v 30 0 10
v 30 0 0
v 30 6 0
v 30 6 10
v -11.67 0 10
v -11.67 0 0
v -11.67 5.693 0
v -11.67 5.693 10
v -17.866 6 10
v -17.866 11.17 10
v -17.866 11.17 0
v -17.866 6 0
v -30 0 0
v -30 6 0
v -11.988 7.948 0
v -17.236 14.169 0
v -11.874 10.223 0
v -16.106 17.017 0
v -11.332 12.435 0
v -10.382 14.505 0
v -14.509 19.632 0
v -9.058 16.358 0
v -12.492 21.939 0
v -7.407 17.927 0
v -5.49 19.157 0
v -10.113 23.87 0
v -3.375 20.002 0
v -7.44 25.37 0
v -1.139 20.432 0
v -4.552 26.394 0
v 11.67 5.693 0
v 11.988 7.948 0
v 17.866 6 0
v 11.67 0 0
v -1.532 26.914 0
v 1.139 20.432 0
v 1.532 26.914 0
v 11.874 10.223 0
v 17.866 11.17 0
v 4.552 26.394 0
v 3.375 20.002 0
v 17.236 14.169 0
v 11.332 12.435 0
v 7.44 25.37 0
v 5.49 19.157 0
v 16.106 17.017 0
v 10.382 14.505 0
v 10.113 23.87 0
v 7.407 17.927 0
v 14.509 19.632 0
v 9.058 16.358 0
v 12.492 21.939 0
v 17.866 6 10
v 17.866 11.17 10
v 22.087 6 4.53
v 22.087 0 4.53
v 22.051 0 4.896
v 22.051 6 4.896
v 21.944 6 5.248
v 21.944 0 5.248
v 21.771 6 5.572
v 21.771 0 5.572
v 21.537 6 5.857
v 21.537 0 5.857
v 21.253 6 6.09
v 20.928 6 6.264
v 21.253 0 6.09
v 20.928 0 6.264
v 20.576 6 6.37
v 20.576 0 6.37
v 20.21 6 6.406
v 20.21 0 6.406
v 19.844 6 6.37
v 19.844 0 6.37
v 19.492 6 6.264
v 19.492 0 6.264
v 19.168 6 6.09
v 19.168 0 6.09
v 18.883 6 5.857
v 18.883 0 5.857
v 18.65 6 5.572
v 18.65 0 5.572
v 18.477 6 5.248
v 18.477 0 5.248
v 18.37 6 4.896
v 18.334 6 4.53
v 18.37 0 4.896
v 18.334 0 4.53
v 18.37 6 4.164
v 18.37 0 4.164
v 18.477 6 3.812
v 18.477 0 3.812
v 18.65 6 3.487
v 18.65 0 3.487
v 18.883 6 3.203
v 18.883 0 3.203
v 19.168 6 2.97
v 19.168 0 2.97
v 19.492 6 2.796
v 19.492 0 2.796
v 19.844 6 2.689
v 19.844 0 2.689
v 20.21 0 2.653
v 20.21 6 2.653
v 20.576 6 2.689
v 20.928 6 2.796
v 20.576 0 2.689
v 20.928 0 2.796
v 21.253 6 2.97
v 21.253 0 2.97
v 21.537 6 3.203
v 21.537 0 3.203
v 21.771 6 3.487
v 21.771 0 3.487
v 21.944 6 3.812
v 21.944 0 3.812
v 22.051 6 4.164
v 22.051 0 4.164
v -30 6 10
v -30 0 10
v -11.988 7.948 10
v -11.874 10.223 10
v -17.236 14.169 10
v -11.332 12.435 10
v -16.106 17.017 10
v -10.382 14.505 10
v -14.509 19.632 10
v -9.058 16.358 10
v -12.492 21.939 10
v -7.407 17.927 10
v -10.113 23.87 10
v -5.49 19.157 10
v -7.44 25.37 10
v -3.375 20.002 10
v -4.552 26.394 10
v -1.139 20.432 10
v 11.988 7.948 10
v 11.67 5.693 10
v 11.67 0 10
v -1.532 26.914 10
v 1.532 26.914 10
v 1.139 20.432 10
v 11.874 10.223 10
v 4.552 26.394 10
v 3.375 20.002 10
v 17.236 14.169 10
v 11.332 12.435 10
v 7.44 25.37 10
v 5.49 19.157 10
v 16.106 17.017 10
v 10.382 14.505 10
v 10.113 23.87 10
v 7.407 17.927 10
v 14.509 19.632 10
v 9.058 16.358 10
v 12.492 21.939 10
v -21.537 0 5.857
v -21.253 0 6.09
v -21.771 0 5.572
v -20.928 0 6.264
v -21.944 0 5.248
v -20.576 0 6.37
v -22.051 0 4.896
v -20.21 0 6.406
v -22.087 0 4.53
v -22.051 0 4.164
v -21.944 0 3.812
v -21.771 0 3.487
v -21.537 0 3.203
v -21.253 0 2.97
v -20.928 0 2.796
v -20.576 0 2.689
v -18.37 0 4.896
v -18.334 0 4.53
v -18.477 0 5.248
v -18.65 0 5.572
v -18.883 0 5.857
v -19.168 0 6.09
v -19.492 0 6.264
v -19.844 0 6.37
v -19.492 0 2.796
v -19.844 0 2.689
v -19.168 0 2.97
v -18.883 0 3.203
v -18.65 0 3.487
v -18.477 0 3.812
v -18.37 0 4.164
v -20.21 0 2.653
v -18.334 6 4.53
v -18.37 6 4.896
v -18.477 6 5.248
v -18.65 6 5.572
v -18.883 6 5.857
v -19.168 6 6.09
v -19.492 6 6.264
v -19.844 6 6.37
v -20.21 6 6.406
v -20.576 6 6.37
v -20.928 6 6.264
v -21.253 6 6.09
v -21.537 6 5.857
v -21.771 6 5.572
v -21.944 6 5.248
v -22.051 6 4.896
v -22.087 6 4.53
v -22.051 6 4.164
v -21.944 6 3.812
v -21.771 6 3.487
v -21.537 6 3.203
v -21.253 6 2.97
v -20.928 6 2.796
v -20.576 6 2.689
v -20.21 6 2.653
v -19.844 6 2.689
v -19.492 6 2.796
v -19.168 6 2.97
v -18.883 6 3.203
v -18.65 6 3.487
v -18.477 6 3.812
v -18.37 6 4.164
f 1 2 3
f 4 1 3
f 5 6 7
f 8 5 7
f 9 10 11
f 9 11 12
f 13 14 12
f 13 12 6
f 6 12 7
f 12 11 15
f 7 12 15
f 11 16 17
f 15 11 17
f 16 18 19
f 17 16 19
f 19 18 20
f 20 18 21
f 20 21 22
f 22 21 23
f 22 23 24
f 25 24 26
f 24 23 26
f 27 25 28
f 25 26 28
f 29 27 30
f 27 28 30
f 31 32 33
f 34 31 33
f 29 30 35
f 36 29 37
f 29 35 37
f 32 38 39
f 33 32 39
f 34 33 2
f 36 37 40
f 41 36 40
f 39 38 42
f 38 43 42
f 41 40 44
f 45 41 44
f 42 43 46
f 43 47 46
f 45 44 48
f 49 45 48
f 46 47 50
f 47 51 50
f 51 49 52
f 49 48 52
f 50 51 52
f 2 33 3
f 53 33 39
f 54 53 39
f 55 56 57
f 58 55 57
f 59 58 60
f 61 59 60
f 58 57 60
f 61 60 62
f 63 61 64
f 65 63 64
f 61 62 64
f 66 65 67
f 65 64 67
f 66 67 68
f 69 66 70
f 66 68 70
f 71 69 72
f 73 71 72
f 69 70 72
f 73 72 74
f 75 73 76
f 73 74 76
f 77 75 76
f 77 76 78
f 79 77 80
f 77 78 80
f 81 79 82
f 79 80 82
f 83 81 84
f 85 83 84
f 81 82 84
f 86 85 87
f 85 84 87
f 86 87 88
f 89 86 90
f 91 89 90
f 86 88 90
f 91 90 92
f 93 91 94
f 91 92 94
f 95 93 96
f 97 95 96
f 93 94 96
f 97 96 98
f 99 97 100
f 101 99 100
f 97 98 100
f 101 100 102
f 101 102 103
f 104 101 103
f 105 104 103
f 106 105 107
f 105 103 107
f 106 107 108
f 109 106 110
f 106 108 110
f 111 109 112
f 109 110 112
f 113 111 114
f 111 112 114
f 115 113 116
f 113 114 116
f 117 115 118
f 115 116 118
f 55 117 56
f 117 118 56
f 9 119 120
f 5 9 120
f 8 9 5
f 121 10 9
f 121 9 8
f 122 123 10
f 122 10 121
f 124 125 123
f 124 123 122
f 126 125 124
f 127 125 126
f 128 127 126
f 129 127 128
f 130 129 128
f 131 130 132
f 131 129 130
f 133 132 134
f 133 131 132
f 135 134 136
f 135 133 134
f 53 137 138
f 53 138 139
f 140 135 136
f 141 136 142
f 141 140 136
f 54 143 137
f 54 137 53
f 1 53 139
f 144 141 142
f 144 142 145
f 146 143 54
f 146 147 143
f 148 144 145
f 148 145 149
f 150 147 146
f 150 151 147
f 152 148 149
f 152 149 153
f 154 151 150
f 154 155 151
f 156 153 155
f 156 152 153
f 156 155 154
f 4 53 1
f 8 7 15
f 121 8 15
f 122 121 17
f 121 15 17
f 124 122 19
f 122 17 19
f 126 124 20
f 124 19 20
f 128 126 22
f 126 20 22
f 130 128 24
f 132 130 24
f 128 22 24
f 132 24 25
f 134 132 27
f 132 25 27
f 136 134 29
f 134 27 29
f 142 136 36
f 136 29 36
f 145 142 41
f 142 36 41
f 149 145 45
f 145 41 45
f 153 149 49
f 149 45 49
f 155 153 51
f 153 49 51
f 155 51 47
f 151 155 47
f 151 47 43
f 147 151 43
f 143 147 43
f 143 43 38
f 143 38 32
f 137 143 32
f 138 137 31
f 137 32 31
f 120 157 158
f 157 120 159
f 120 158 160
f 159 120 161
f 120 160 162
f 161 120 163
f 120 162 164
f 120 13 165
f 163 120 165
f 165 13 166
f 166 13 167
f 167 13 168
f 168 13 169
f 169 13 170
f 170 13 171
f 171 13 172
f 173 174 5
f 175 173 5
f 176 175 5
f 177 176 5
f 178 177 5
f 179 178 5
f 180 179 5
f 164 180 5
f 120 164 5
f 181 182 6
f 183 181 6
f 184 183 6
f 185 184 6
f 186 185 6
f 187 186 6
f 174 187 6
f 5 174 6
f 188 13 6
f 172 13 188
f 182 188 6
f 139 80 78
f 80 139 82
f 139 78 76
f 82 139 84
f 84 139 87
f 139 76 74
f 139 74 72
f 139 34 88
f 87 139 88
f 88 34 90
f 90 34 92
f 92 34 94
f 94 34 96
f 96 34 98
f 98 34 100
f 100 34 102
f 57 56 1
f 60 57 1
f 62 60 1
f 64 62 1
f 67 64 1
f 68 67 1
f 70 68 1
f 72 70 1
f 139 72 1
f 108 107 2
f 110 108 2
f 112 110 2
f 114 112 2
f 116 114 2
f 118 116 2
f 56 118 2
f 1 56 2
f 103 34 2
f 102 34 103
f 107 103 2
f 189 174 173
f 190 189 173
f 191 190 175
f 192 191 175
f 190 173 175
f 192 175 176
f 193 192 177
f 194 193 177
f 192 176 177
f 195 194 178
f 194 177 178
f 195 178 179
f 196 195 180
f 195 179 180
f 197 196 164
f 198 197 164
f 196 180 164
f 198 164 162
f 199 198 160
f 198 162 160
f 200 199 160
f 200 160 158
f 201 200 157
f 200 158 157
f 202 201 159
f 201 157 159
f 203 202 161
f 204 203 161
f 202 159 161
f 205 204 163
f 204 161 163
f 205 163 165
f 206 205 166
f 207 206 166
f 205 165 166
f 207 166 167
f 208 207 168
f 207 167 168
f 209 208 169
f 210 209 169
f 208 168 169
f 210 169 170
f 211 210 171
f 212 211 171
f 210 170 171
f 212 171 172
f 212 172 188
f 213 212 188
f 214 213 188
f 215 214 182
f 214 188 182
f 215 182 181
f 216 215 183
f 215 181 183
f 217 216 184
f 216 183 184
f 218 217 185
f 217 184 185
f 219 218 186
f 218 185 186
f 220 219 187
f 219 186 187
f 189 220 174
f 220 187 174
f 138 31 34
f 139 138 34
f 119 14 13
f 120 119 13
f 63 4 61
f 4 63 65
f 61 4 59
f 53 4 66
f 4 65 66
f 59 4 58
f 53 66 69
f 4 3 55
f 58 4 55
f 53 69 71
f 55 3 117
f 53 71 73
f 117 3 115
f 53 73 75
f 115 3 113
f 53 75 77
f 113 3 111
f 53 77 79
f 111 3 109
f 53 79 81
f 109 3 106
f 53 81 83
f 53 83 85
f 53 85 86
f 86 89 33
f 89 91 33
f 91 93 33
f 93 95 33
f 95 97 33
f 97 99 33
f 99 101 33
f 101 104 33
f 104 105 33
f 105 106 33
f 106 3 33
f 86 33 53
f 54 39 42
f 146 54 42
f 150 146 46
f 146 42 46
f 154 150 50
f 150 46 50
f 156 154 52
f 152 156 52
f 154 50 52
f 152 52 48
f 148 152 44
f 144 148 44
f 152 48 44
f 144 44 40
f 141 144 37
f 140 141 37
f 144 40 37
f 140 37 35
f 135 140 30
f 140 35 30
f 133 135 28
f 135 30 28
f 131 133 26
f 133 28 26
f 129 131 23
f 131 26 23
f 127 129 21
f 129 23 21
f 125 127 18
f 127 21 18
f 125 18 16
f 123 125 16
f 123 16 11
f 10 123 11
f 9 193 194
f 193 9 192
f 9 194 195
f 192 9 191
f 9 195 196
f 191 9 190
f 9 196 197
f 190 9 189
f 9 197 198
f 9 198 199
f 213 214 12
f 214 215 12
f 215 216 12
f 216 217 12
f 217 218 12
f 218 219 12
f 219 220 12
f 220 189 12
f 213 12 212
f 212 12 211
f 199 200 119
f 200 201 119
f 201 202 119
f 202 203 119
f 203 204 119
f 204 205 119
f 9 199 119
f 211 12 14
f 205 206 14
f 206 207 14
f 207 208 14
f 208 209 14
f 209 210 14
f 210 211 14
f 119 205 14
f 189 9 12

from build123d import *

# Parameters (mm, degrees)
F1_DEPTH = 10
F2_R     = 1.876476
F3_DEPTH = 6


with BuildPart() as f1:
    # F0 (on Top) → F1 (new body)
    with BuildSketch(Plane.XY):
        with BuildLine():
            ThreePointArc((17.866252, 11.169709), (0, 26.979497), (-17.866252, 11.169709))
            Line((-17.866252, 11.169709), (-17.866252, 6))
            Line((-17.866252, 6), (-30, 6))
            Line((-30, 6), (-30, 0))
            Line((-30, 0), (-11.670343, 0))
            Line((-11.670343, 0), (-11.670343, 5.692855))
            ThreePointArc((-11.670343, 5.692855), (0, 20.486258), (11.670343, 5.692855))
            Line((11.670343, 5.692855), (11.670343, 0))
            Line((11.670343, 0), (30, 0))
            Line((30, 0), (30, 6))
            Line((30, 6), (17.866252, 6))
            Line((17.866252, 6), (17.866252, 11.169709))
        make_face()
    extrude(amount=F1_DEPTH)

    # F2 (on Front) → F3 (cut)
    with BuildSketch(Plane.XZ):
        with Locations((-20.210268, 4.529888)):
            Circle(F2_R)
        with Locations((20.210268, 4.529888)):
            Circle(F2_R)
    extrude(amount=-F3_DEPTH, mode=Mode.SUBTRACT)


solid = f1.part
